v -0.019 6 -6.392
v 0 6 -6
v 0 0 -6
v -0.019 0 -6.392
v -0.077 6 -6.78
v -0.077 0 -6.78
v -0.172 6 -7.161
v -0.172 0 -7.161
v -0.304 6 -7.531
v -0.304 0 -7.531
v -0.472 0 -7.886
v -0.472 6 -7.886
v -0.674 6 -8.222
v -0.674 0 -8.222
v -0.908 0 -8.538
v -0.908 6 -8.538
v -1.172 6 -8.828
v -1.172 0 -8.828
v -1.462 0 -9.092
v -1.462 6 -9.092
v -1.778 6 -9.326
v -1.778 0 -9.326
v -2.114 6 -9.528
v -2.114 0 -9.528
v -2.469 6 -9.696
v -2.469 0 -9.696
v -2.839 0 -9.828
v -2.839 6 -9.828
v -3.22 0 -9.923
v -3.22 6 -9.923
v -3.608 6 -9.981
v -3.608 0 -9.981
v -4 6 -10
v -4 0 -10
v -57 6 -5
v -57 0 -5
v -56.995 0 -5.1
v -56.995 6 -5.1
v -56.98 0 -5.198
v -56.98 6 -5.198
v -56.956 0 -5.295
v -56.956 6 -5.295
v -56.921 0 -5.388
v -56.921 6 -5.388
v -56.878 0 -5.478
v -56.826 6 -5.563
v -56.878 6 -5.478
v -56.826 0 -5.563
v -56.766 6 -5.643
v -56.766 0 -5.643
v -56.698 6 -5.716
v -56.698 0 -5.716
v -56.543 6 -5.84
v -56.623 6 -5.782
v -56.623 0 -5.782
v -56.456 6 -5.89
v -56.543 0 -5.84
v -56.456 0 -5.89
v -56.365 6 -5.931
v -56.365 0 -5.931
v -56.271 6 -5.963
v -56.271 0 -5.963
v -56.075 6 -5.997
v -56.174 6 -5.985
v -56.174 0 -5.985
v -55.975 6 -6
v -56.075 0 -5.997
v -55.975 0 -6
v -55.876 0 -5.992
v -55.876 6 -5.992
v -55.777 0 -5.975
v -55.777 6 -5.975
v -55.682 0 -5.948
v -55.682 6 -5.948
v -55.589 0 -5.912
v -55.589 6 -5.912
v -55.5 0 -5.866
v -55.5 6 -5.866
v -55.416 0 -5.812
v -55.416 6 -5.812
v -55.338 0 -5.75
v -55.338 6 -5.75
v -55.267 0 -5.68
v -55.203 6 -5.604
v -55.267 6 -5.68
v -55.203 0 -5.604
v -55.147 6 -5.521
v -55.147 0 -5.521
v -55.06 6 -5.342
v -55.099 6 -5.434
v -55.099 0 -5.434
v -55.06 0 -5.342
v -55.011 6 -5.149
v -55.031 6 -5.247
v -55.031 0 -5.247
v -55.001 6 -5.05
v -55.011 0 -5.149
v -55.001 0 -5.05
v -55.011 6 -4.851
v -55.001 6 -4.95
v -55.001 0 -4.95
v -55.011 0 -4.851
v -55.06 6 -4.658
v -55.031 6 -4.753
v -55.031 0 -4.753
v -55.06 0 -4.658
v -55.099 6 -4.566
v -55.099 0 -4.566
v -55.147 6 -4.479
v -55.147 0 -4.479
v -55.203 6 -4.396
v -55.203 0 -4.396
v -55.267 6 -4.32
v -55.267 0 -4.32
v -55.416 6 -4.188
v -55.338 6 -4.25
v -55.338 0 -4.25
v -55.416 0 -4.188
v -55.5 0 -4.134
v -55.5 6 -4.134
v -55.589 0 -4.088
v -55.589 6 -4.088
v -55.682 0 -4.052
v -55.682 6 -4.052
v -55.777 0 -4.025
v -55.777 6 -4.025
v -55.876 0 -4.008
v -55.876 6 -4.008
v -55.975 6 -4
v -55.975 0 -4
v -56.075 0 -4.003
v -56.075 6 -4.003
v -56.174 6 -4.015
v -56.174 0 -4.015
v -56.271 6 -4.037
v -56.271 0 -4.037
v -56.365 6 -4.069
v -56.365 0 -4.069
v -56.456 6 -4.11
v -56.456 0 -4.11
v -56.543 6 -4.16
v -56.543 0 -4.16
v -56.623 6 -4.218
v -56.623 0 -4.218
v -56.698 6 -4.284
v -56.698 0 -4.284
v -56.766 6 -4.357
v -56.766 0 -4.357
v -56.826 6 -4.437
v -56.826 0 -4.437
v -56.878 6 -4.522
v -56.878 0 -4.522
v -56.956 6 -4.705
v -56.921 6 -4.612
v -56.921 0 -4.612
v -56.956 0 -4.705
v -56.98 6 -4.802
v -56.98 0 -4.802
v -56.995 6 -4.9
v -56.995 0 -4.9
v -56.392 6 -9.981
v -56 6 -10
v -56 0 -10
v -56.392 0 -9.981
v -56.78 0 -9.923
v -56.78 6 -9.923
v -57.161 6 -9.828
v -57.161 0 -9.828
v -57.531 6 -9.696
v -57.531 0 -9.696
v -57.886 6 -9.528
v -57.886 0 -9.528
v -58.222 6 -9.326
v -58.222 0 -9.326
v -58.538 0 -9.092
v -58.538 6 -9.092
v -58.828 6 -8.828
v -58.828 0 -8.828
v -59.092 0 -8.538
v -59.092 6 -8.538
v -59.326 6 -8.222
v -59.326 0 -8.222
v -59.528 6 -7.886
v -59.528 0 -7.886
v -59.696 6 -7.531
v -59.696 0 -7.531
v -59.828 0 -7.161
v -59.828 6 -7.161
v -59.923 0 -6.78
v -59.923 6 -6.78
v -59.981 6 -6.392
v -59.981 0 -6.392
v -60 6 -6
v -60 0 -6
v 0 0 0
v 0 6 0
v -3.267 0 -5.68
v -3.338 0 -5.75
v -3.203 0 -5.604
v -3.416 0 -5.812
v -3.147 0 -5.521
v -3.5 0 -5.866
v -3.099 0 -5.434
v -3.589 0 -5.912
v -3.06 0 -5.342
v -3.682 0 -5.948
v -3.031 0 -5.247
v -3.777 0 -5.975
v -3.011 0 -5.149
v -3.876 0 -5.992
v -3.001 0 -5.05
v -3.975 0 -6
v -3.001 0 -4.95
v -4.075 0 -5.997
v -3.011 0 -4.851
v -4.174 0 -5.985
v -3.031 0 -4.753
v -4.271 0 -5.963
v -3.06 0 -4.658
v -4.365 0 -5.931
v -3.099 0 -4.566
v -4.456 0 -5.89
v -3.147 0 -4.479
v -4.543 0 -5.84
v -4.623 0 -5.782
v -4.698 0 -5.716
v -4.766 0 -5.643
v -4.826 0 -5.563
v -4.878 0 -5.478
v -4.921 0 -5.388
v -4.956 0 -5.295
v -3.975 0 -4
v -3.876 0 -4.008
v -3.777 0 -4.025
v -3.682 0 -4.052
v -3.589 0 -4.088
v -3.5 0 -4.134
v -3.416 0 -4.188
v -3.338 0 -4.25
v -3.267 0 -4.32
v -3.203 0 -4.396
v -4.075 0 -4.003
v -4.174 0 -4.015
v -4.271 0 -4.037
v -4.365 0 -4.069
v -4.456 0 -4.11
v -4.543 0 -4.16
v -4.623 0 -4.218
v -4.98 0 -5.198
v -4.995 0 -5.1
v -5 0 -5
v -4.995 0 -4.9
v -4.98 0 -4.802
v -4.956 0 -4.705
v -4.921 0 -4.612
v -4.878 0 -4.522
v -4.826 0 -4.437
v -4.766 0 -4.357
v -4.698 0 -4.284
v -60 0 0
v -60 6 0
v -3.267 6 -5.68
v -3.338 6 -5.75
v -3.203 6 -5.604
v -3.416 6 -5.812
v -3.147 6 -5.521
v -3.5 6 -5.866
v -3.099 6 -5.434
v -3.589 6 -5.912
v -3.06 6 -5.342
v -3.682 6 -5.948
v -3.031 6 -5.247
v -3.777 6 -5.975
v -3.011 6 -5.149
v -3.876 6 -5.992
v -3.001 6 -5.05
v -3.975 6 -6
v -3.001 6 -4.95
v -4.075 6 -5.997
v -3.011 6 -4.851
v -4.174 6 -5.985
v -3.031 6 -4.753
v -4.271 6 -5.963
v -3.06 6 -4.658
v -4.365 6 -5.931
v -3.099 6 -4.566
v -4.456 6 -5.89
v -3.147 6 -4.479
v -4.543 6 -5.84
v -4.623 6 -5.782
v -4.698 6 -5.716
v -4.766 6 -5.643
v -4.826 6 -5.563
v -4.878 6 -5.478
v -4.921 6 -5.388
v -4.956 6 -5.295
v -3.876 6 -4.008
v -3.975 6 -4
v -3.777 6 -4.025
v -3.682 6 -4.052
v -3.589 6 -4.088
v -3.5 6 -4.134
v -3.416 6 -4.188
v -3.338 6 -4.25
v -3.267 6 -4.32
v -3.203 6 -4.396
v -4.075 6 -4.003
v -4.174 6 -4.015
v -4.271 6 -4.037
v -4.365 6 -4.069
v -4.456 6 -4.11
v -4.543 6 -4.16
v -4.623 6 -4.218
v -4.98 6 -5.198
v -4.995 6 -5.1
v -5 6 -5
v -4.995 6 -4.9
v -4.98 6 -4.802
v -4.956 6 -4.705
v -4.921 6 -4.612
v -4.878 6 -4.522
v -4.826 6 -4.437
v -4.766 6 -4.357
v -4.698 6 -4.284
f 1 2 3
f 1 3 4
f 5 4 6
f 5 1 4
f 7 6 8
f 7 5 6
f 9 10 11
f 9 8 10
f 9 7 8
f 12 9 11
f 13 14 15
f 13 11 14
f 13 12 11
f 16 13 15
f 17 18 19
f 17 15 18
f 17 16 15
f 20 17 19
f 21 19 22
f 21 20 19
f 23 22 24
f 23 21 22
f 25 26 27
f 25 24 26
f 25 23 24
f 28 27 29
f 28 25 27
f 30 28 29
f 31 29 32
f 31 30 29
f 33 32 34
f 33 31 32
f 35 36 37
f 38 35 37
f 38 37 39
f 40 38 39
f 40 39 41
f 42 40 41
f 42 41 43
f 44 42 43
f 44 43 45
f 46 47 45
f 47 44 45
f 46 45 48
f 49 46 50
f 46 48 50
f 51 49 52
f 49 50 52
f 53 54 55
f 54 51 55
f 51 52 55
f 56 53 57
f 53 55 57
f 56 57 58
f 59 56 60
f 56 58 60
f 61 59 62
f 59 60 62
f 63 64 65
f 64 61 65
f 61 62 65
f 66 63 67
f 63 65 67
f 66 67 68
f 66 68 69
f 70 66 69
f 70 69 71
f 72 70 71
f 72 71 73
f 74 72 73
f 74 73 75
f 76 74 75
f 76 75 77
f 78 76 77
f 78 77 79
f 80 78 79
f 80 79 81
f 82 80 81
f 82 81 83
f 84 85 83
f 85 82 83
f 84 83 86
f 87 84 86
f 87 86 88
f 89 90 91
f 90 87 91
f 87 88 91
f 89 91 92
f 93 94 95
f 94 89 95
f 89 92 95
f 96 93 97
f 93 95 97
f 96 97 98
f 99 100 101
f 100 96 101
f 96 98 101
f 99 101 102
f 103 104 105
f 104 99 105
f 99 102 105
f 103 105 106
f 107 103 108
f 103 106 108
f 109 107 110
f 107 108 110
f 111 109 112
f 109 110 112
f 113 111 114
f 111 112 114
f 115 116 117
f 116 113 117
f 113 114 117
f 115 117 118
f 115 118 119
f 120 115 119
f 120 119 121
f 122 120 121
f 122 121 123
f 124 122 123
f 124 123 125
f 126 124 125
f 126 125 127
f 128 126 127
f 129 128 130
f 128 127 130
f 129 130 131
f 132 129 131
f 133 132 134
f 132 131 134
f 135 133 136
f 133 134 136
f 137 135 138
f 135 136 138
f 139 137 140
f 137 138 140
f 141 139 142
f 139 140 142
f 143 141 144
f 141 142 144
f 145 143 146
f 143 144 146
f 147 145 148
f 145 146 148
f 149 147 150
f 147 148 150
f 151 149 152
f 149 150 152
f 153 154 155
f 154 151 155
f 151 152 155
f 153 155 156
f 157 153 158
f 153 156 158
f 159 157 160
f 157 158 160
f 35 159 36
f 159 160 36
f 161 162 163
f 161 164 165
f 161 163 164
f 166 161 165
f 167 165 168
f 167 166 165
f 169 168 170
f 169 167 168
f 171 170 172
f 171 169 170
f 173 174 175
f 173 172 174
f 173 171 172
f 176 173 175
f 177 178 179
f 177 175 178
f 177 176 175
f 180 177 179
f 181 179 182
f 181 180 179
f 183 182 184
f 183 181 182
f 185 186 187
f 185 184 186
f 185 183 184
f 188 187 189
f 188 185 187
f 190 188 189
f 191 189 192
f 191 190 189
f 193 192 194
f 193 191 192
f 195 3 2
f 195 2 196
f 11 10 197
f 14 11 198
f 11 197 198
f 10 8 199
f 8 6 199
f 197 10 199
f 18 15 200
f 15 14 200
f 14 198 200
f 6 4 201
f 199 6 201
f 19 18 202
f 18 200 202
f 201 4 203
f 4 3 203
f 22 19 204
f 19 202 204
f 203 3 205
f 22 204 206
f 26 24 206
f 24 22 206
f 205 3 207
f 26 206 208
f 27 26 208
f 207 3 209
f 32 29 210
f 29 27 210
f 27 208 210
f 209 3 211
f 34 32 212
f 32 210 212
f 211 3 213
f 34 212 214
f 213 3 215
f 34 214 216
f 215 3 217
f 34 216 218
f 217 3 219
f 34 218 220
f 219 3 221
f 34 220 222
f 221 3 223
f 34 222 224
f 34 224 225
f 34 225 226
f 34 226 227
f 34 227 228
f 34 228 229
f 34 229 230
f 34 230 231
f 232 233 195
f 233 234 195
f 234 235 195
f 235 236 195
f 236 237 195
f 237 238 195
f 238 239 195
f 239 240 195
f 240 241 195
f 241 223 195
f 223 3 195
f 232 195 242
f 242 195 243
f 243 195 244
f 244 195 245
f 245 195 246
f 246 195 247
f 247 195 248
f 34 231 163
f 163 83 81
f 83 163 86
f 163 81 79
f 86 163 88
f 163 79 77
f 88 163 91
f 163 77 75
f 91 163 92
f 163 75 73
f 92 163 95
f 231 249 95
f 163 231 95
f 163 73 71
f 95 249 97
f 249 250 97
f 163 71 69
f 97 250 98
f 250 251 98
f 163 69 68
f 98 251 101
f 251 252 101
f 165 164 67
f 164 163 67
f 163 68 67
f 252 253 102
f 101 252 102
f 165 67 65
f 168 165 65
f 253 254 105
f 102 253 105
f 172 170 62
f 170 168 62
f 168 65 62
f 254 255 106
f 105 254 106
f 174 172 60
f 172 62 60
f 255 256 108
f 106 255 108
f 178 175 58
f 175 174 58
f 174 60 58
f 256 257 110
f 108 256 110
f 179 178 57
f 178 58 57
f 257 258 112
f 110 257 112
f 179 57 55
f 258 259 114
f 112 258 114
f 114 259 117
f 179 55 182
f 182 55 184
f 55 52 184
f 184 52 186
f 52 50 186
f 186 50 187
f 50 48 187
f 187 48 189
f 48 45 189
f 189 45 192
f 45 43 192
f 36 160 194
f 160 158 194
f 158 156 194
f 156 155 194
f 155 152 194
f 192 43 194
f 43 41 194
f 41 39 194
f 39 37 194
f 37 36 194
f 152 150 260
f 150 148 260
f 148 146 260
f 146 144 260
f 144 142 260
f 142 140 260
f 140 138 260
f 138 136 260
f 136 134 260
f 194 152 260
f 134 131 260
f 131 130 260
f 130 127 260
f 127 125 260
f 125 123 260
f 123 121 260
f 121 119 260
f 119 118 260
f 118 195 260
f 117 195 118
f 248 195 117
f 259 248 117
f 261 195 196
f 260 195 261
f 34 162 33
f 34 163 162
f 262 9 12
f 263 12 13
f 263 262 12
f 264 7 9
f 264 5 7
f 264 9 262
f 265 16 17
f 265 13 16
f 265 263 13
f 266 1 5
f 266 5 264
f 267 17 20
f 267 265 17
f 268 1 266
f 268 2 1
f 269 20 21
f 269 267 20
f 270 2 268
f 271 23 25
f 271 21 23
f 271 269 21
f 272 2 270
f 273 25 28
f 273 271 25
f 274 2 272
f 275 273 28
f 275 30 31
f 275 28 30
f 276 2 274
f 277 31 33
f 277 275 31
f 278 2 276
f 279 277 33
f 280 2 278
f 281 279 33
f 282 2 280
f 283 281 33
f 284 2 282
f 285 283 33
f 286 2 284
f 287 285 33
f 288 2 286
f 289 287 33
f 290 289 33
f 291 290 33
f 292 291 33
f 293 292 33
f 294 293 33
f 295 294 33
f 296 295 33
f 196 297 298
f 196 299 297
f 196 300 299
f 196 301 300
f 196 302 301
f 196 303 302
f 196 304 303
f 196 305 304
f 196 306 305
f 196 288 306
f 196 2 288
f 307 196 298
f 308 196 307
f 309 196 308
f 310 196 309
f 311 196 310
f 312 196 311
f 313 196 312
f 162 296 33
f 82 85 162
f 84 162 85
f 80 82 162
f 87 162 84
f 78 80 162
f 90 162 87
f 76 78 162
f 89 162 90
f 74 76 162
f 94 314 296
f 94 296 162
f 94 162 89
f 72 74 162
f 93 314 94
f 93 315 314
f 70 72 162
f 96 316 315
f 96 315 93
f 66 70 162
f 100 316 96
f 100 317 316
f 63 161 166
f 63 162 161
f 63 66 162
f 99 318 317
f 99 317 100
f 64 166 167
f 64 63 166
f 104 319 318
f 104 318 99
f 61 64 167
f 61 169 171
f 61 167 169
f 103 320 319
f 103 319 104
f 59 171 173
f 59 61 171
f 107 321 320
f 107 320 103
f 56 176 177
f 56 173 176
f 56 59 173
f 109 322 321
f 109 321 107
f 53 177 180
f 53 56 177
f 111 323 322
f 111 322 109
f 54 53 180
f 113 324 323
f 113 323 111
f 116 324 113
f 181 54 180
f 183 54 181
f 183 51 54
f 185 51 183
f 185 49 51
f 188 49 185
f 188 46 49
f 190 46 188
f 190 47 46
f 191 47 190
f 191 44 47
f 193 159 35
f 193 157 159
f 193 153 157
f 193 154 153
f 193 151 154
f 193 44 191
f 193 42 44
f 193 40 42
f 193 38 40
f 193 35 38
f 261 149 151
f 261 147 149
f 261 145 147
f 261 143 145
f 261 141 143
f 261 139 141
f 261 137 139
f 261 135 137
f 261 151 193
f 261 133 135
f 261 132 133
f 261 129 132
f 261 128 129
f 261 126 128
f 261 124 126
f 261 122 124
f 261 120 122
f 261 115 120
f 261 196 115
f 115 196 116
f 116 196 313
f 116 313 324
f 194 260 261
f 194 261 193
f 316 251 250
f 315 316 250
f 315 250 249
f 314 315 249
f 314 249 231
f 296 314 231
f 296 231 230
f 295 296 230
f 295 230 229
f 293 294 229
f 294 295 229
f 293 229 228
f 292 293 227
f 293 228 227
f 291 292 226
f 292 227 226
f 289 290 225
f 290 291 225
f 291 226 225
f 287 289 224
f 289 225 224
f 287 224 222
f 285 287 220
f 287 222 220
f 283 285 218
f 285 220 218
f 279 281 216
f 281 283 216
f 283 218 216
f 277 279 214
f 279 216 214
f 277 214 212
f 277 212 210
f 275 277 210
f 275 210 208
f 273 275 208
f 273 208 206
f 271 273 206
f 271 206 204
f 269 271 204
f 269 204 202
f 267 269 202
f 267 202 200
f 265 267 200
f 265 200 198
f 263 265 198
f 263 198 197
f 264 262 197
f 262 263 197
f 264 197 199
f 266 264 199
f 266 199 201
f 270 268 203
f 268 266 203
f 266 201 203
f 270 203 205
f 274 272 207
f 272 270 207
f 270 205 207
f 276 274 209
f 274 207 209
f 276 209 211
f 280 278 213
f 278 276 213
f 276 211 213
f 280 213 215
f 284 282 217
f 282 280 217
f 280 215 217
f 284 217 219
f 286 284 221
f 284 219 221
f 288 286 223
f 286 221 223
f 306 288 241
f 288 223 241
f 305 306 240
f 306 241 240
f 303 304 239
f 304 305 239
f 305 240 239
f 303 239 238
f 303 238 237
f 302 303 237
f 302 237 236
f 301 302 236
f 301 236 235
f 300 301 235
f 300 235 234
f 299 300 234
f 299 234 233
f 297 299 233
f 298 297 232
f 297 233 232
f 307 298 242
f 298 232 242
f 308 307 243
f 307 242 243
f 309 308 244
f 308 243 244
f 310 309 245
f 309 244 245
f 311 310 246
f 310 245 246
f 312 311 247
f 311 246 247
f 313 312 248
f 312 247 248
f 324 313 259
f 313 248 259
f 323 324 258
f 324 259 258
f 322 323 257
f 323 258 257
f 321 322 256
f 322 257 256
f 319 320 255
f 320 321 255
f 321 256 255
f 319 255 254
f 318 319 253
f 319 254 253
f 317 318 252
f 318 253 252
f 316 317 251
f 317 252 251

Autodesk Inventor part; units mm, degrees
ref_plane "YZ Plane" through (0, 0, 0) normal (1, 0, 0) x (0, 1, 0)
ref_plane "XZ Plane" through (0, 0, 0) normal (0, 1, 0) x (-1, 0, 0)
ref_plane "XY Plane" through (0, 0, 0) normal (0, 0, 1) x (1, 0, 0)
sketch "Sketch1" plane through (0, 0, 0) normal (0, 1, 0) x (-1, 0, 0)
  line L0 (0, 0) -> (60, 0)
  line L1 (60, 0) -> (60, -10)
  line L2 (60, -10) -> (0, -10)
  line L3 (0, -10) -> (0, 0)
  circle A0 centre (4, -5) radius 1
  circle A1 centre (56, -5) radius 1
  line L4 (60, -5) -> (0, -5) construction
  dimension "d0" = 10
  dimension "d1" = 60
  dimension "d2" = 2
  dimension "d3" = 4
  dimension "d4" = 4
extrude "Extrusion1" add sketch "Sketch1" along normal blind 6
fillet "Fillet1" radius 4 2 edges at (0, 3, -10) (-60, 3, -10)
properties part number "humidity_support"
